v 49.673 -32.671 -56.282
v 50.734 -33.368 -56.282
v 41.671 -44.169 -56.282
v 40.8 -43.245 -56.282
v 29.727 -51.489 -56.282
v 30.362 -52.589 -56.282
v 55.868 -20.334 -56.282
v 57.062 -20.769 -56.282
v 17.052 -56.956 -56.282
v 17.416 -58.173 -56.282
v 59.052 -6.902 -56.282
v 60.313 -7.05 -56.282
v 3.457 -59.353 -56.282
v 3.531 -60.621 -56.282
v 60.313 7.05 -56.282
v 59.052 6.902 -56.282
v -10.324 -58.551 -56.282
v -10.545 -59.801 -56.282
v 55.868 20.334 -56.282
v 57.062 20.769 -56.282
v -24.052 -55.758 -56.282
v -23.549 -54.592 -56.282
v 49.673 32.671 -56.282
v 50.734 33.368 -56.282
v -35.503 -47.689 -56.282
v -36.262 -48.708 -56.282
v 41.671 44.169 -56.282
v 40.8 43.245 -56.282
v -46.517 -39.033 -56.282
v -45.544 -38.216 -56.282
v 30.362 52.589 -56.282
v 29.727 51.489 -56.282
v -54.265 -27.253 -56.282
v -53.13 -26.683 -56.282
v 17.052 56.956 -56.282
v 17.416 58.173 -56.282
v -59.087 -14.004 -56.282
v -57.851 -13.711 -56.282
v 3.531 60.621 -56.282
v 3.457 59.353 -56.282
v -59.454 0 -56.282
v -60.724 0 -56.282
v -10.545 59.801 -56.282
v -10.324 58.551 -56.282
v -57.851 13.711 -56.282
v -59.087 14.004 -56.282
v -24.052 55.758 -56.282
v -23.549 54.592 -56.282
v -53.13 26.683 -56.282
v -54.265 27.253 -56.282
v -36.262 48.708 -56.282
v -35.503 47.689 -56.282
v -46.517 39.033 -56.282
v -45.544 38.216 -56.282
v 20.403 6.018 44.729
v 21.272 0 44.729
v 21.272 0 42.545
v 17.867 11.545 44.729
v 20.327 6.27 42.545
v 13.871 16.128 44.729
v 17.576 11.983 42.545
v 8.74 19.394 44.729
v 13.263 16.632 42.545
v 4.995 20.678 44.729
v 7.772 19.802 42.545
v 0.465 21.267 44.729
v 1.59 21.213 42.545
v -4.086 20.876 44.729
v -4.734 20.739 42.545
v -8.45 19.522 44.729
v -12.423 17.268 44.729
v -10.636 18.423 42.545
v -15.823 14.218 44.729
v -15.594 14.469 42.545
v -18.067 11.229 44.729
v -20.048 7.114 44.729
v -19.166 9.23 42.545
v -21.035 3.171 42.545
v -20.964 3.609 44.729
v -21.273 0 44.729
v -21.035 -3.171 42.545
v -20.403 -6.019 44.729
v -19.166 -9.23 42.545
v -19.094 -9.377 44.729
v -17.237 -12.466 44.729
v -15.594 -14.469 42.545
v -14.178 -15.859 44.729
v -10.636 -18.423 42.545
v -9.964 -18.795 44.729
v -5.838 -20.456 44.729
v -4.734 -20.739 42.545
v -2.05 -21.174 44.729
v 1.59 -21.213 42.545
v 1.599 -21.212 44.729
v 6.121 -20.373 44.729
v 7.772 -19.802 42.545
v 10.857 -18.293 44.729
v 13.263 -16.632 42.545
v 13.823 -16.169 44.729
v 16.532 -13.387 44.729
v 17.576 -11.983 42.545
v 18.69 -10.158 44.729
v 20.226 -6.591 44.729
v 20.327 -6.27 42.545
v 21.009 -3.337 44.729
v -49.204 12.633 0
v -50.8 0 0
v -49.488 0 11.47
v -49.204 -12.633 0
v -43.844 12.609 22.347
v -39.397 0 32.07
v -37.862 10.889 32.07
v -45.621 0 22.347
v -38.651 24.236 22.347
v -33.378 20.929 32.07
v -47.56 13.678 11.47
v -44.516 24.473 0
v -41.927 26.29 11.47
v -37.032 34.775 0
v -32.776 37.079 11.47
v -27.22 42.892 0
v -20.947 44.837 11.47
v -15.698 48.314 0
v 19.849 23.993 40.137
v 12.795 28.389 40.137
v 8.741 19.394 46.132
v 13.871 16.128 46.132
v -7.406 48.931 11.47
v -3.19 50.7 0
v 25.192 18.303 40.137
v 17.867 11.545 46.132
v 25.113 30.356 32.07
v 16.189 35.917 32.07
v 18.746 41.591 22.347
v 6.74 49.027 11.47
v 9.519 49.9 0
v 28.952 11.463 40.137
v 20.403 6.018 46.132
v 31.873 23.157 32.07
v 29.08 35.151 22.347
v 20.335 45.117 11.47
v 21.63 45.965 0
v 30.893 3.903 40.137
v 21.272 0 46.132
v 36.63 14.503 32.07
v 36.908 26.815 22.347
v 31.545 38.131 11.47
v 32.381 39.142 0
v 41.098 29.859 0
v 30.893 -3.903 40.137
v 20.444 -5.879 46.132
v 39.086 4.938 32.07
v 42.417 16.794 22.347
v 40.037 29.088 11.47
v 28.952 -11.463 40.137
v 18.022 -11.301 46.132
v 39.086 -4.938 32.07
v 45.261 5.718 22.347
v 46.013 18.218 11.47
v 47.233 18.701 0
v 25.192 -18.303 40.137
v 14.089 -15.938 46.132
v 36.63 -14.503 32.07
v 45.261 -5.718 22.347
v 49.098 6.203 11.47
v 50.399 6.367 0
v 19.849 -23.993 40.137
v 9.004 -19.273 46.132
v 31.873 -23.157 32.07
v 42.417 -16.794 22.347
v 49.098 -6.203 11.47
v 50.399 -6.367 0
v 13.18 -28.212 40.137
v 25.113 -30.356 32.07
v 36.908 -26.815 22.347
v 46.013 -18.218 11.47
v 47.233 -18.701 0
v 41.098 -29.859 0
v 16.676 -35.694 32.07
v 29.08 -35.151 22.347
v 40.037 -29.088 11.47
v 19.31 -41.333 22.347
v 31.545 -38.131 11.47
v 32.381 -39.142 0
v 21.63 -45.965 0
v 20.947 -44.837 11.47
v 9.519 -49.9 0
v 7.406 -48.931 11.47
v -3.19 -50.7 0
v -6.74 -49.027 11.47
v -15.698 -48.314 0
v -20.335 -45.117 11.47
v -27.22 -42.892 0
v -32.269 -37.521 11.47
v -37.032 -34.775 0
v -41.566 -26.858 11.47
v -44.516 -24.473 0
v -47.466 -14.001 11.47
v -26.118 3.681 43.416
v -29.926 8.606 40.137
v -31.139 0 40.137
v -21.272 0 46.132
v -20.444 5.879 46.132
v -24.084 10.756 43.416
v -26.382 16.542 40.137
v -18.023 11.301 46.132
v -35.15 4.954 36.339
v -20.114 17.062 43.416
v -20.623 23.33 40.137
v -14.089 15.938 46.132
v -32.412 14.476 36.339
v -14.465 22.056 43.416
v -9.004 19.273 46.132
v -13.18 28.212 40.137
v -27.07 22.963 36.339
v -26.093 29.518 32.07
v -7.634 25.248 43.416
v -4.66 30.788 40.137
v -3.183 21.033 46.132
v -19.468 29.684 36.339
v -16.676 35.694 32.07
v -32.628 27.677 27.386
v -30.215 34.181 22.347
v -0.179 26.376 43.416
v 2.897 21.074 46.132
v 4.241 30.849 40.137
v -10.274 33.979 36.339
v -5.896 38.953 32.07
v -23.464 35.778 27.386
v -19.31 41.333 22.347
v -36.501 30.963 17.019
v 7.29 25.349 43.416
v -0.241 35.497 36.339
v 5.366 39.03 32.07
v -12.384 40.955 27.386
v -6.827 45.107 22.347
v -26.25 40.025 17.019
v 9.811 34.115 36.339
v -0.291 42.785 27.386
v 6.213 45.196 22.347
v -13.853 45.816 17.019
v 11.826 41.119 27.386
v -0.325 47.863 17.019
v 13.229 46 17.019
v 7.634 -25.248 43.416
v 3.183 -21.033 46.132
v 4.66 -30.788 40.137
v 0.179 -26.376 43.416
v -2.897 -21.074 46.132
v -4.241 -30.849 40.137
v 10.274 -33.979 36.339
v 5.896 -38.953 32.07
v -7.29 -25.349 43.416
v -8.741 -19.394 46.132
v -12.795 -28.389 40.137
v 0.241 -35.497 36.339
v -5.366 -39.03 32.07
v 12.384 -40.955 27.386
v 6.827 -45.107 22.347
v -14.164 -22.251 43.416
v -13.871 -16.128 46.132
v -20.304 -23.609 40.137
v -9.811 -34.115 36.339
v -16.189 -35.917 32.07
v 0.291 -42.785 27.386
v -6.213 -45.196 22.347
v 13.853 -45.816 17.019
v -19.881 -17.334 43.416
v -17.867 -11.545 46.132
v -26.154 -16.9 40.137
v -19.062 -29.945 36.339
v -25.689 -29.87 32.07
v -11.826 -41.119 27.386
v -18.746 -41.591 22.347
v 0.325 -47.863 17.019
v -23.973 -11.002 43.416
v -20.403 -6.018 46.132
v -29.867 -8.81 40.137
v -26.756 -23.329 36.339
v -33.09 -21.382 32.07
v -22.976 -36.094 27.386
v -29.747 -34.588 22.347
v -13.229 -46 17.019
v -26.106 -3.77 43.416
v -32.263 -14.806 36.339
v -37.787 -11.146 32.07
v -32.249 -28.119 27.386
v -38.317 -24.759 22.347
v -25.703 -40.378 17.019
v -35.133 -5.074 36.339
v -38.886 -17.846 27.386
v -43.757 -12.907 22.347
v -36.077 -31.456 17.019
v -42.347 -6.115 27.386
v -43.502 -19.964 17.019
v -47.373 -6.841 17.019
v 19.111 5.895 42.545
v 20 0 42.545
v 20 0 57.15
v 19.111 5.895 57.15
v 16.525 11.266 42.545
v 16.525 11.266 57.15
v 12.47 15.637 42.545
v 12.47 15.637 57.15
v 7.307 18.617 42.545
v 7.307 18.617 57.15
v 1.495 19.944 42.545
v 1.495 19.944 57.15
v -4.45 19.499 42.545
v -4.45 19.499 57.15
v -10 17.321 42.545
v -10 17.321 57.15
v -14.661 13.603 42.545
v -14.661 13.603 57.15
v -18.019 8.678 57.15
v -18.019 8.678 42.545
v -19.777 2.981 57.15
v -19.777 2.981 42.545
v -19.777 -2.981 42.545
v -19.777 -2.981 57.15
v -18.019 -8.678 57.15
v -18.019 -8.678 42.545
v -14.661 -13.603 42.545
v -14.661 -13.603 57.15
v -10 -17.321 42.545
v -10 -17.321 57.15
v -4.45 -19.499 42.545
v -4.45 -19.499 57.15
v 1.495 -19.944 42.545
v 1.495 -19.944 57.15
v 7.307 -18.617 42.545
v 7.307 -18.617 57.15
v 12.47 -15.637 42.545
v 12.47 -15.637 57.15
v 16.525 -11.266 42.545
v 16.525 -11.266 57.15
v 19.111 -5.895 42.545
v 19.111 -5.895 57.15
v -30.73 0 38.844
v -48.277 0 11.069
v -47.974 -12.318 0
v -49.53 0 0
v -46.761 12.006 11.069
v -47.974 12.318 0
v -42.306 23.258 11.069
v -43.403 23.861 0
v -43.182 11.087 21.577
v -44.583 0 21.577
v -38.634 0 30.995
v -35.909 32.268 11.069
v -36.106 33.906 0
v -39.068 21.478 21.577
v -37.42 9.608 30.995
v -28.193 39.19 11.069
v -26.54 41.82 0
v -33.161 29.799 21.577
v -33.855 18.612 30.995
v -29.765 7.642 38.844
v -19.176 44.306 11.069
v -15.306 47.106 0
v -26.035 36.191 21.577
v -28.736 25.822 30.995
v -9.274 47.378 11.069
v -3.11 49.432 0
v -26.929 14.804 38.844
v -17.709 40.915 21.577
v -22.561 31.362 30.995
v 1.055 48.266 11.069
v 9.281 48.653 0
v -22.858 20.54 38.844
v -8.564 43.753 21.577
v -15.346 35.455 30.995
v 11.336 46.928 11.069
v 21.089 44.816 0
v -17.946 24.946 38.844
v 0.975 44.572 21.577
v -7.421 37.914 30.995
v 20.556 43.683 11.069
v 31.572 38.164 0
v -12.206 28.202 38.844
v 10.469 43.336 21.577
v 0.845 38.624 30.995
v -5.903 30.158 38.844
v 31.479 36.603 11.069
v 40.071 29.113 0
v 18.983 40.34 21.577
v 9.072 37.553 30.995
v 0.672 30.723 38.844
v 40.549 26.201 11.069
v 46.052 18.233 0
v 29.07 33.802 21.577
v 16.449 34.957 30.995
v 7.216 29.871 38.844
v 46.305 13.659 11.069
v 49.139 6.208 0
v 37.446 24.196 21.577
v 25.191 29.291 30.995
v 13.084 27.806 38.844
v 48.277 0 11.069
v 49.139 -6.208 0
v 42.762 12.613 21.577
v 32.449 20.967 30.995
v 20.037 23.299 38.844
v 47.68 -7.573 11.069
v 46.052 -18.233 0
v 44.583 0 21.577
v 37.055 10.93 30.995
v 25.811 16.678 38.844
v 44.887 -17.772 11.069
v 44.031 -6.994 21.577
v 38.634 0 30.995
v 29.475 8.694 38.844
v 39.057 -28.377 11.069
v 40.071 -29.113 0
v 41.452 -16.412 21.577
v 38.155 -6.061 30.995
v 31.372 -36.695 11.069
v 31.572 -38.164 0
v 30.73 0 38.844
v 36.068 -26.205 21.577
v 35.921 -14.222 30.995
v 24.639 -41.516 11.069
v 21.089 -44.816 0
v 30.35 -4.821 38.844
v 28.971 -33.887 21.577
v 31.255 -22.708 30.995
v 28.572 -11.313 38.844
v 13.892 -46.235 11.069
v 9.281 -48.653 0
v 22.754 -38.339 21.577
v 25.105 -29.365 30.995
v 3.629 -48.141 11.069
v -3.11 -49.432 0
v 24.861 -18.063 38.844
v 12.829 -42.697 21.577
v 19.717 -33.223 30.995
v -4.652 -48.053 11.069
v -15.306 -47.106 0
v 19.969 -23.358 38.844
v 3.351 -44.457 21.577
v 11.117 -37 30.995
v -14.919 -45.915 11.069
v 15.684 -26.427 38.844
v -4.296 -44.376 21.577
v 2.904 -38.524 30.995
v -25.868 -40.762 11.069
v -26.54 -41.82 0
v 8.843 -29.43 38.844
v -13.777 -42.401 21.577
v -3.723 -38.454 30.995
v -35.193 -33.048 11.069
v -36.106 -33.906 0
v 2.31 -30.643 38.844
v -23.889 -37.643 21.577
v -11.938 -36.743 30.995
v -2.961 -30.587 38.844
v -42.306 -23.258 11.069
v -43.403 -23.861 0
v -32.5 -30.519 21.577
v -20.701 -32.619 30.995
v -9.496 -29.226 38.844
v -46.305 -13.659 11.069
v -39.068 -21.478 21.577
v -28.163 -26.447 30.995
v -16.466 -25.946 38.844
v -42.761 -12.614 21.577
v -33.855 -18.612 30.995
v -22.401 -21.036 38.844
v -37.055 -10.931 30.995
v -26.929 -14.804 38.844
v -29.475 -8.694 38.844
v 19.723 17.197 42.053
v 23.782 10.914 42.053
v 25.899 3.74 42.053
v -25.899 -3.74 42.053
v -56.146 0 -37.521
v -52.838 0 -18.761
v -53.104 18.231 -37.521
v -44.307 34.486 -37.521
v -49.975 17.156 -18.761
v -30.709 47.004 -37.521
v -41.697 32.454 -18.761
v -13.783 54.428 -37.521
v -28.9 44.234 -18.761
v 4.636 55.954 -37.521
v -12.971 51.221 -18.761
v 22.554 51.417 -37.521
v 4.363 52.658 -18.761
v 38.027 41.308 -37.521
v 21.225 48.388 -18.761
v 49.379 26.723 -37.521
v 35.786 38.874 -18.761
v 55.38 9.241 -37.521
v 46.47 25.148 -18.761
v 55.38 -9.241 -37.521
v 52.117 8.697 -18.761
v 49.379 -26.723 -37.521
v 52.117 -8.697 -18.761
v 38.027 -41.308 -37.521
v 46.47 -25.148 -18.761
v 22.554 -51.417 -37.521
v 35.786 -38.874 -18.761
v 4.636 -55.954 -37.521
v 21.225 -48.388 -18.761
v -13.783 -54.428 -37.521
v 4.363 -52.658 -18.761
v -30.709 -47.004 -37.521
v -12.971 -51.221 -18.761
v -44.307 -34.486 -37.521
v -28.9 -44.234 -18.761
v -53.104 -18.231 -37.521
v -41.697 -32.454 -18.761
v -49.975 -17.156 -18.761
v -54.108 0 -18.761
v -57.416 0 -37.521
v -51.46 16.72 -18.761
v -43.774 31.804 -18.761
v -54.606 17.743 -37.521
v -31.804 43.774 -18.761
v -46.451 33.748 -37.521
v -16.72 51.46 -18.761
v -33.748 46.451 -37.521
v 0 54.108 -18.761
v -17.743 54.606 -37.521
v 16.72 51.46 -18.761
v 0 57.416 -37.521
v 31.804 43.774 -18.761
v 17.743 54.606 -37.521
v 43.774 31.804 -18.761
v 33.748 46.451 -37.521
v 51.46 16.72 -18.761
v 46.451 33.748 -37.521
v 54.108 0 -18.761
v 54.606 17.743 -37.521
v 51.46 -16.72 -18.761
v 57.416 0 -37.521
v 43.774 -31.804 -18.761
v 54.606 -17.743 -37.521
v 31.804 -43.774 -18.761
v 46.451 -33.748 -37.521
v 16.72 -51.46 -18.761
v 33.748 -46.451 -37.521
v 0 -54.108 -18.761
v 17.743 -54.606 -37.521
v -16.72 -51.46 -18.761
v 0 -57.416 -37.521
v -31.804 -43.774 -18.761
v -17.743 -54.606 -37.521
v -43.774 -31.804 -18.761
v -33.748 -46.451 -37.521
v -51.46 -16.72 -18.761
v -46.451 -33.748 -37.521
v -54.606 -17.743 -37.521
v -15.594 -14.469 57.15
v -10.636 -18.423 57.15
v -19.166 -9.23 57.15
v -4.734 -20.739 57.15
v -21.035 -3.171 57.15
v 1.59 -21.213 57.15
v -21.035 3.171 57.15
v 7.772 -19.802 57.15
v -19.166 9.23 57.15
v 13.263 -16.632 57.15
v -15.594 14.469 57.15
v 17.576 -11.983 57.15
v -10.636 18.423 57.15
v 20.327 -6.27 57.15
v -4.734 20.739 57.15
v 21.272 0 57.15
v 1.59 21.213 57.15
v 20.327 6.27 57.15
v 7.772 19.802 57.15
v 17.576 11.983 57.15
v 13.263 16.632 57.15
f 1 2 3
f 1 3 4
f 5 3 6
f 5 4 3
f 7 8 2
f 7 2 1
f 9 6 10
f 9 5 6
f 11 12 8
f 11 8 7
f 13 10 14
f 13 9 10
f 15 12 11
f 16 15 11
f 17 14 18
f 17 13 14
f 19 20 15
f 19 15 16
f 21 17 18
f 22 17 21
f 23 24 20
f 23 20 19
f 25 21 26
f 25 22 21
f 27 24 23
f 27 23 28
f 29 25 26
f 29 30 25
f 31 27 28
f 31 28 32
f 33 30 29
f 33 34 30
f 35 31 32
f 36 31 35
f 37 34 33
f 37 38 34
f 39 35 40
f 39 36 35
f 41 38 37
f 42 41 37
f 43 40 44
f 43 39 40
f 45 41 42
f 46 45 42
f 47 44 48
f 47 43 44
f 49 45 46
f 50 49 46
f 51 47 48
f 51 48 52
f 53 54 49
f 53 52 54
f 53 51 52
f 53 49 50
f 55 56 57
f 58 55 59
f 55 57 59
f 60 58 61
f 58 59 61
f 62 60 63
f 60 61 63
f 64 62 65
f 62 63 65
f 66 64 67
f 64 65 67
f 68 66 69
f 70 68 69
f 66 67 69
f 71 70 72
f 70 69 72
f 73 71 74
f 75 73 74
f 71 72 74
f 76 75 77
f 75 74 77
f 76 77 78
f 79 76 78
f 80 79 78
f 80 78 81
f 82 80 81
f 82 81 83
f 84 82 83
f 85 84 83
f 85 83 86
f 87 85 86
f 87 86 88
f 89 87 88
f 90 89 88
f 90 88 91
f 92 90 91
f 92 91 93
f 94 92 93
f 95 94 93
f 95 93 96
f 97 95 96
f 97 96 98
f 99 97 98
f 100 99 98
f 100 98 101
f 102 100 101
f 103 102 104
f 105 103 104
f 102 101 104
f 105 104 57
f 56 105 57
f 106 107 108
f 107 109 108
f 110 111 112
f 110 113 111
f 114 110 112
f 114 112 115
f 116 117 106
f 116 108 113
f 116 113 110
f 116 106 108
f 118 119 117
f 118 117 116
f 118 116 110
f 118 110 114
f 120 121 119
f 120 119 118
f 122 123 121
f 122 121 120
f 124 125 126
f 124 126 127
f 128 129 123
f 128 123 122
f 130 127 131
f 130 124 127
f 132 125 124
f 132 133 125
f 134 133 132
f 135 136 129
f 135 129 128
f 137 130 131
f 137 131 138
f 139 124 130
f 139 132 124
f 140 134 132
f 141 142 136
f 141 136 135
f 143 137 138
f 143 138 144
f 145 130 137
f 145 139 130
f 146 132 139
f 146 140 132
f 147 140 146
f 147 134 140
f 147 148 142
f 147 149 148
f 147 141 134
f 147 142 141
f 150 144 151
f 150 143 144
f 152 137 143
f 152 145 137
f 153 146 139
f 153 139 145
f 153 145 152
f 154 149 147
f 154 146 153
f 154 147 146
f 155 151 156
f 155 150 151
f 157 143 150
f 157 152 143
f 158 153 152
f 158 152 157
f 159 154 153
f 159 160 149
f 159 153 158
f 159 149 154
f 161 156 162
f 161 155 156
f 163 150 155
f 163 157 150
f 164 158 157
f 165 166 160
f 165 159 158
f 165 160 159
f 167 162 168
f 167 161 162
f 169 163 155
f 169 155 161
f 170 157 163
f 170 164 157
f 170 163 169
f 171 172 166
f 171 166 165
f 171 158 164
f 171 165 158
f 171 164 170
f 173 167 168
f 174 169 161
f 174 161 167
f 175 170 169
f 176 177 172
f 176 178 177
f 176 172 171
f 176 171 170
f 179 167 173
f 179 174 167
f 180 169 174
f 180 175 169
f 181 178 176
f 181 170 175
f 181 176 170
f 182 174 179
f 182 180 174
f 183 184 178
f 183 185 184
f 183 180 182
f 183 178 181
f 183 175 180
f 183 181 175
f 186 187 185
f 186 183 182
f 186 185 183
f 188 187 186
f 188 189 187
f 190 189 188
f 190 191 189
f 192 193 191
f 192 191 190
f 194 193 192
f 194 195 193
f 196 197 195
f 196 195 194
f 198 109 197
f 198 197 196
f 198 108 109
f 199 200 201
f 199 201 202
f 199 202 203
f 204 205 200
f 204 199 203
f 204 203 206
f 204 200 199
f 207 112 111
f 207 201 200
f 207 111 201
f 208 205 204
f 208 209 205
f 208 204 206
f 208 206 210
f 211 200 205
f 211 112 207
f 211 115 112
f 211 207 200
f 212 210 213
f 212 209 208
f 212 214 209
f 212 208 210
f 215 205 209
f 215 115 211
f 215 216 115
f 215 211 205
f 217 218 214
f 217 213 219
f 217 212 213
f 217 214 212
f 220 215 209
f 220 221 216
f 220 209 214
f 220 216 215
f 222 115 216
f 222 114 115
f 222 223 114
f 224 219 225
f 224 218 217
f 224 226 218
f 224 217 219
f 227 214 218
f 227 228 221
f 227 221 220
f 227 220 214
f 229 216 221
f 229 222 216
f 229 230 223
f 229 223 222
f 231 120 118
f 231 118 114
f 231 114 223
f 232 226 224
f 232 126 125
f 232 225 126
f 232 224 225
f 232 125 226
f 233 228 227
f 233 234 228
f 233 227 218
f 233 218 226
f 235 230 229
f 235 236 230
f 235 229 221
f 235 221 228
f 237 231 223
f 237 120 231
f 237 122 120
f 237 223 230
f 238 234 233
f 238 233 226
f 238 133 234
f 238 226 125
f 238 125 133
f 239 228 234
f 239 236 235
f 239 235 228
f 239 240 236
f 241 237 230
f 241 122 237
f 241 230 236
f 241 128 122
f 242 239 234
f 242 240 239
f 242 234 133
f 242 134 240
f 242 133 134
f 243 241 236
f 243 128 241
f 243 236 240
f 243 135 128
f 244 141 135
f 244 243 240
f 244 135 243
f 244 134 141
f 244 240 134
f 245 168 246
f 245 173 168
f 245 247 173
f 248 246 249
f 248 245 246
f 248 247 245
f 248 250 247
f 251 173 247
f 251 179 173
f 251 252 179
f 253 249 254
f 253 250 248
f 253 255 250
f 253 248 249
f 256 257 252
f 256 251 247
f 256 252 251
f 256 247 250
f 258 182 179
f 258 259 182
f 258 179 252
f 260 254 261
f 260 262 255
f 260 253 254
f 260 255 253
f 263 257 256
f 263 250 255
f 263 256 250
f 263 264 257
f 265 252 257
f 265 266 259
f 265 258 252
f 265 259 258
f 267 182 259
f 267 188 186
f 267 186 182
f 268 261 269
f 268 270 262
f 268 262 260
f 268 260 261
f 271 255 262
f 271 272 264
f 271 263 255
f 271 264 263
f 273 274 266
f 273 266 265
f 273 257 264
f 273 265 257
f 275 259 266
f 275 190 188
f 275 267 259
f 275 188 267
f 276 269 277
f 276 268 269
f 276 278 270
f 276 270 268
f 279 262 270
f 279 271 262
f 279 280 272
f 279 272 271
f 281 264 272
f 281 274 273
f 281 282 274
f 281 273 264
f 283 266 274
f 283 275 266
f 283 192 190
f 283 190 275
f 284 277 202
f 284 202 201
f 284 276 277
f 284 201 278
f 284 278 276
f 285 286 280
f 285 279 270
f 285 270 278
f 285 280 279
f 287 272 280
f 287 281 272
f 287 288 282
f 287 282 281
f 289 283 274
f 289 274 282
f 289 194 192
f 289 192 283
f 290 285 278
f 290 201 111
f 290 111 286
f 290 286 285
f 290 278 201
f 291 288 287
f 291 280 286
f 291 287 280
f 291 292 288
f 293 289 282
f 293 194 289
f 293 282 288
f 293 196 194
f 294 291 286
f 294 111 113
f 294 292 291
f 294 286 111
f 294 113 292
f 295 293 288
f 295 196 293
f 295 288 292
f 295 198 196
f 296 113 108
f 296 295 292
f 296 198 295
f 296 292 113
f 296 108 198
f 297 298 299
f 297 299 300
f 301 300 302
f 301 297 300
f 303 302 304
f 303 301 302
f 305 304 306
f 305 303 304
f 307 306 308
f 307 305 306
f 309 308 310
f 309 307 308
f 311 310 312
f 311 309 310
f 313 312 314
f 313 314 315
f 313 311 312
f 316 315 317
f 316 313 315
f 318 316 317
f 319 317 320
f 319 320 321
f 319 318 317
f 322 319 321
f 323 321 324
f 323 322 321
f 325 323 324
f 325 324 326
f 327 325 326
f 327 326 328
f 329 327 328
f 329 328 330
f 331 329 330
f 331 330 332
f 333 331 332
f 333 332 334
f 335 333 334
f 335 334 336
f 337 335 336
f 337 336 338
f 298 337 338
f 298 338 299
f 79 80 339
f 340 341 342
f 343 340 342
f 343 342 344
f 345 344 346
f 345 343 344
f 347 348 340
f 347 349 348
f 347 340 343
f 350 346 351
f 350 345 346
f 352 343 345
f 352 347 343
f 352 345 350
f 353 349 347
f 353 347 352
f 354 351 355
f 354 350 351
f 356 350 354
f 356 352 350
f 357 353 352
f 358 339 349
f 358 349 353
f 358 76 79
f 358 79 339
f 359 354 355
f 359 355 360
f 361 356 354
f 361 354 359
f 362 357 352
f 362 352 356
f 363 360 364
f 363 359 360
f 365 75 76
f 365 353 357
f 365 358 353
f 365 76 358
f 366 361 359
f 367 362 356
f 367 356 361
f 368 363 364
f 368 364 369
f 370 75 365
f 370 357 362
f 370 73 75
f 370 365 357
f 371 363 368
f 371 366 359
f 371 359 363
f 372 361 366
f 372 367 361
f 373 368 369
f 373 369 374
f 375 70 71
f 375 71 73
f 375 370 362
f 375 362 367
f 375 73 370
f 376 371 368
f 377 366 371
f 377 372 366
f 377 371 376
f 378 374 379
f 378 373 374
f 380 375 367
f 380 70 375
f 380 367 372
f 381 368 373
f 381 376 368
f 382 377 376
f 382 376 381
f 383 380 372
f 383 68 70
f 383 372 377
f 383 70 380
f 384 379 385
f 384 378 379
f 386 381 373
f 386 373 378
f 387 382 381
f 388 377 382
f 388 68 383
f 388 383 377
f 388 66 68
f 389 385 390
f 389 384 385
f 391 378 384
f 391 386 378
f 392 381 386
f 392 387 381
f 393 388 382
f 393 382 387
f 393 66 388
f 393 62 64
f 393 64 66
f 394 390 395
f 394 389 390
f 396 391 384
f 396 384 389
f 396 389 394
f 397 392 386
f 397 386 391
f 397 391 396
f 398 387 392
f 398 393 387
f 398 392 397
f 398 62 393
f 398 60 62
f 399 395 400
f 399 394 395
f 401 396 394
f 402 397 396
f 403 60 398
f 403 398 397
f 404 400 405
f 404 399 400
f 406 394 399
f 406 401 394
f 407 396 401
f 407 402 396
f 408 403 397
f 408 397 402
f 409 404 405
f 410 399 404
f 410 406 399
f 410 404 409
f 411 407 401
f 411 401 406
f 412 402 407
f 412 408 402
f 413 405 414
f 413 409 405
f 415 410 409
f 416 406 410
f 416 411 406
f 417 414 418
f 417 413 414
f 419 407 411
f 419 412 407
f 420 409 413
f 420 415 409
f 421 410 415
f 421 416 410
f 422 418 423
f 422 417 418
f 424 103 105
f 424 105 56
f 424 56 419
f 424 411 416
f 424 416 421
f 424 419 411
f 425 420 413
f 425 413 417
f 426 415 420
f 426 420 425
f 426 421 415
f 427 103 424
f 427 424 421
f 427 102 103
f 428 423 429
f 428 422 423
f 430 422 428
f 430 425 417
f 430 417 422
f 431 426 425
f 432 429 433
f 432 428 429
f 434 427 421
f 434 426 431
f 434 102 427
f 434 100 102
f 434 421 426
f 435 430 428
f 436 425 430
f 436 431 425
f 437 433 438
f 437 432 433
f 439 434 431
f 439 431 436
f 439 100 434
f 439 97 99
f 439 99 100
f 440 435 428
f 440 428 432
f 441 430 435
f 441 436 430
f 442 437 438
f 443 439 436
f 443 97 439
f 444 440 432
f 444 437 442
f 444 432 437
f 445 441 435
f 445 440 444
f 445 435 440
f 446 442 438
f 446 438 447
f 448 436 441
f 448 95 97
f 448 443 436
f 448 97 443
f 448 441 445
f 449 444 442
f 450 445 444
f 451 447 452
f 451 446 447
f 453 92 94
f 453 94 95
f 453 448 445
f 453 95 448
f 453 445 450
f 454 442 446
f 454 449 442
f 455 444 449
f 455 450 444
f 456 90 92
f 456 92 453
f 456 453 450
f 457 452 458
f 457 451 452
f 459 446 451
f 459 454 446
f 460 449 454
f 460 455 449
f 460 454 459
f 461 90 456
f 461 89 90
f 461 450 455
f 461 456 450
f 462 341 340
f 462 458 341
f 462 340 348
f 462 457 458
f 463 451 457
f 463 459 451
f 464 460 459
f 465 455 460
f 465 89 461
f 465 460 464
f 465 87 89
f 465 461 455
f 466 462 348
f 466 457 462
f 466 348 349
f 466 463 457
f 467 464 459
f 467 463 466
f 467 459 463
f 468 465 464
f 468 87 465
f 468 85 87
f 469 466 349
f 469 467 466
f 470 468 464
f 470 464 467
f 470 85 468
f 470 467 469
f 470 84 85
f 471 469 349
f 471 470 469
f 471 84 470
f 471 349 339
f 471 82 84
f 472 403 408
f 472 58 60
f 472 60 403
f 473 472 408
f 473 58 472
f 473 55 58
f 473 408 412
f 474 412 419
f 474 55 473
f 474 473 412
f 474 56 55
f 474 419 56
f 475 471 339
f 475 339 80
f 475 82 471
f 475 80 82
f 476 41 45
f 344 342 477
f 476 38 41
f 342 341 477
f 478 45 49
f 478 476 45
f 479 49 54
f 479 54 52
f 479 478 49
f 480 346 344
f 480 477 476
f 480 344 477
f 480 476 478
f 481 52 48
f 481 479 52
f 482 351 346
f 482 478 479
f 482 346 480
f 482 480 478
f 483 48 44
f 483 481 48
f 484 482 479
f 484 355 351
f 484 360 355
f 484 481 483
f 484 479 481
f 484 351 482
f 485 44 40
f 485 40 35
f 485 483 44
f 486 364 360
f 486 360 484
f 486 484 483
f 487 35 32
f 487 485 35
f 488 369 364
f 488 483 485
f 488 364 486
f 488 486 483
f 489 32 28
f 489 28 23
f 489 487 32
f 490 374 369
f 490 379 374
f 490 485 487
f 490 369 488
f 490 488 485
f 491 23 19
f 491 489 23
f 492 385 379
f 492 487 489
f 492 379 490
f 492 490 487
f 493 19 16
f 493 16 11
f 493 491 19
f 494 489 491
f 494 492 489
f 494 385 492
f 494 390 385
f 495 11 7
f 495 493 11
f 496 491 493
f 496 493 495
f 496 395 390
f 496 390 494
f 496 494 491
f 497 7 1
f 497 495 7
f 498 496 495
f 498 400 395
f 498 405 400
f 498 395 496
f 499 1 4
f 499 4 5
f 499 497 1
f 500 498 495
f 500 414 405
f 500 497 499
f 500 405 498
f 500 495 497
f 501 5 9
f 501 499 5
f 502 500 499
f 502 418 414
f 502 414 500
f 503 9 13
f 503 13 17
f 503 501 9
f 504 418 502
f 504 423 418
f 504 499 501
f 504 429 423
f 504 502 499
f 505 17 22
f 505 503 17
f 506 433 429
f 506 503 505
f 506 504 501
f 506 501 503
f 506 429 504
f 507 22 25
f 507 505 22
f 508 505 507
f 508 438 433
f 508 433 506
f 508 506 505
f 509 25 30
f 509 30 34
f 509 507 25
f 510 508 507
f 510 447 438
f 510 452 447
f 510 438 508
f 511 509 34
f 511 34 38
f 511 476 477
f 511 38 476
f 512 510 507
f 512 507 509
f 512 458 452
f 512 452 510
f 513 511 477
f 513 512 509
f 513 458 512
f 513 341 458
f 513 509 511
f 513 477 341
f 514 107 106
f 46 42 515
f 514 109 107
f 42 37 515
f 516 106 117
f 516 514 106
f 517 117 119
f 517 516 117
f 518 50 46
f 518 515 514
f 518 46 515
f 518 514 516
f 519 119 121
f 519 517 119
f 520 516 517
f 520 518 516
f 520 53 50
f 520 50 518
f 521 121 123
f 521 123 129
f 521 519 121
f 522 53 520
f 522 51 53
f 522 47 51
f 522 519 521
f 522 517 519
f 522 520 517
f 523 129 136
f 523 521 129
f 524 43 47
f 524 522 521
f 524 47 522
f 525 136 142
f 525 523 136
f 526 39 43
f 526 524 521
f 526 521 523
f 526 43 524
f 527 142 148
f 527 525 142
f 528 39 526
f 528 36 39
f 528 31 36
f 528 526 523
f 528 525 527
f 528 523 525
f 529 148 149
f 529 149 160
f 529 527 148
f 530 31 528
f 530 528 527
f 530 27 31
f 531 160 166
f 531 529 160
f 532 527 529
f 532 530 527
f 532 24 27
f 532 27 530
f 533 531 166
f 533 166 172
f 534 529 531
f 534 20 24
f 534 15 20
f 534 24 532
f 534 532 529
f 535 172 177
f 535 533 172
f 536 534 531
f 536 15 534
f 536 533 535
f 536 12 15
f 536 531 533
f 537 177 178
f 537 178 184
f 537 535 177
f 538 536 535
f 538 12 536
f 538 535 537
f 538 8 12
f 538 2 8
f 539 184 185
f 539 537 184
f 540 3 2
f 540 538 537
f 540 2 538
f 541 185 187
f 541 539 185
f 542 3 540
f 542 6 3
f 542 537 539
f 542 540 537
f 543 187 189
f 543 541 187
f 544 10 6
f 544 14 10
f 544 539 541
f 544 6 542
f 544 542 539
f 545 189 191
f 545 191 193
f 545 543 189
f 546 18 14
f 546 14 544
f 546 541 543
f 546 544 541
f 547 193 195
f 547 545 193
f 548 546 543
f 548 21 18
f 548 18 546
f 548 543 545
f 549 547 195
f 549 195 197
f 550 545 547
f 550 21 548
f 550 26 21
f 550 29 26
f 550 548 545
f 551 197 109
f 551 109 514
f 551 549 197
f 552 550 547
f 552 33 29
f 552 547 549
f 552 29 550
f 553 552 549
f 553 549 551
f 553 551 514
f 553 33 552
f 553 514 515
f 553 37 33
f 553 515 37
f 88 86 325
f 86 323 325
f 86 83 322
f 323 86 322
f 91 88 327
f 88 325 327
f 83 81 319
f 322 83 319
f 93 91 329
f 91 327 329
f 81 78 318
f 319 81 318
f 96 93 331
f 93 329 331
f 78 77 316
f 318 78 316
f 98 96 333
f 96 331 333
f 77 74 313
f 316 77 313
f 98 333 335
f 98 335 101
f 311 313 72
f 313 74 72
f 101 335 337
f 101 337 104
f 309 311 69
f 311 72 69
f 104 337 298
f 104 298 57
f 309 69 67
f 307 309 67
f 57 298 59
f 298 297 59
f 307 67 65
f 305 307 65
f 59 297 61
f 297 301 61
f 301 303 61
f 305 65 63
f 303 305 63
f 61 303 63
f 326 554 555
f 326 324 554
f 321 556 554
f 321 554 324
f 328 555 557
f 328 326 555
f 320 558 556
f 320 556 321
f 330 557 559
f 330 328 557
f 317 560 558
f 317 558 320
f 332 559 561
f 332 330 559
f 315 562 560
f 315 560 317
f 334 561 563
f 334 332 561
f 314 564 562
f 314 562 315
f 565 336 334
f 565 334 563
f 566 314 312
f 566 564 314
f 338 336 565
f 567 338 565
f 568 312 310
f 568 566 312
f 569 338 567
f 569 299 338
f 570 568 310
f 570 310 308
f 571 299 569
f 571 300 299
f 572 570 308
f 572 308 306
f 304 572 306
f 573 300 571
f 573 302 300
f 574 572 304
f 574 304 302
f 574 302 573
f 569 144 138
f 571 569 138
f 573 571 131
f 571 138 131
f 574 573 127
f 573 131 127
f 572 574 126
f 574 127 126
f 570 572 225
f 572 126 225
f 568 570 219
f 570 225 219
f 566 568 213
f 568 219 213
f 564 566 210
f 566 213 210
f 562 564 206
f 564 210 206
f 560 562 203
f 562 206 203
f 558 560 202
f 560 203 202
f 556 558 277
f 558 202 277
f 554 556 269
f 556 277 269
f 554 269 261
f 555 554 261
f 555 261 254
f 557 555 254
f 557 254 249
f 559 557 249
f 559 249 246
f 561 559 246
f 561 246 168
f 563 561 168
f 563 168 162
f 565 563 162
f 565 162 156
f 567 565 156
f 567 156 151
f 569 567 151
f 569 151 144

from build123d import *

# Parameters (mm, degrees)
F2_R     = 21.2725
F2_R_2   = 20
F3_DEPTH = 57.15
F4_DEPTH = 57.151
F5_DEPTH = 42.545


with BuildPart() as f1:
    # F0 (on Front) → F1 (revolve)
    with BuildSketch(Plane.XZ):
        with BuildLine():
            Line((0, 49.53), (0, 50.8))
            ThreePointArc((0, 50.8), (-35.921024, 35.921024), (-50.8, 0))
            Line((-50.8, 0), (-49.53, 0))
            ThreePointArc((-49.53, 0), (-35.022999, 35.022999), (0, 49.53))
        make_face()
        Polygon((-49.53, 0), (-50.8, 0), (-60.723993, -56.281763), (-59.453993, -56.281763), align=None)
    revolve(axis=Axis((0, 0, -2.740882), (0, 0, -1)))

    # F2 (on Top) → F3 (join)
    with BuildSketch(Plane.XY):
        Circle(F2_R)
        Circle(F2_R_2, mode=Mode.SUBTRACT)
    extrude(amount=F3_DEPTH)

    # F2 (on Top) → F4 (cut, through all)
    with BuildSketch(Plane.XY):
        Circle(F2_R_2)
    extrude(amount=F4_DEPTH, mode=Mode.SUBTRACT)

    # F2 (on Top) → F5 (cut)
    with BuildSketch(Plane.XY):
        Circle(F2_R_2)
        Circle(F2_R)
        Circle(F2_R_2, mode=Mode.SUBTRACT)
    extrude(amount=F5_DEPTH, mode=Mode.SUBTRACT)


solid = f1.part
